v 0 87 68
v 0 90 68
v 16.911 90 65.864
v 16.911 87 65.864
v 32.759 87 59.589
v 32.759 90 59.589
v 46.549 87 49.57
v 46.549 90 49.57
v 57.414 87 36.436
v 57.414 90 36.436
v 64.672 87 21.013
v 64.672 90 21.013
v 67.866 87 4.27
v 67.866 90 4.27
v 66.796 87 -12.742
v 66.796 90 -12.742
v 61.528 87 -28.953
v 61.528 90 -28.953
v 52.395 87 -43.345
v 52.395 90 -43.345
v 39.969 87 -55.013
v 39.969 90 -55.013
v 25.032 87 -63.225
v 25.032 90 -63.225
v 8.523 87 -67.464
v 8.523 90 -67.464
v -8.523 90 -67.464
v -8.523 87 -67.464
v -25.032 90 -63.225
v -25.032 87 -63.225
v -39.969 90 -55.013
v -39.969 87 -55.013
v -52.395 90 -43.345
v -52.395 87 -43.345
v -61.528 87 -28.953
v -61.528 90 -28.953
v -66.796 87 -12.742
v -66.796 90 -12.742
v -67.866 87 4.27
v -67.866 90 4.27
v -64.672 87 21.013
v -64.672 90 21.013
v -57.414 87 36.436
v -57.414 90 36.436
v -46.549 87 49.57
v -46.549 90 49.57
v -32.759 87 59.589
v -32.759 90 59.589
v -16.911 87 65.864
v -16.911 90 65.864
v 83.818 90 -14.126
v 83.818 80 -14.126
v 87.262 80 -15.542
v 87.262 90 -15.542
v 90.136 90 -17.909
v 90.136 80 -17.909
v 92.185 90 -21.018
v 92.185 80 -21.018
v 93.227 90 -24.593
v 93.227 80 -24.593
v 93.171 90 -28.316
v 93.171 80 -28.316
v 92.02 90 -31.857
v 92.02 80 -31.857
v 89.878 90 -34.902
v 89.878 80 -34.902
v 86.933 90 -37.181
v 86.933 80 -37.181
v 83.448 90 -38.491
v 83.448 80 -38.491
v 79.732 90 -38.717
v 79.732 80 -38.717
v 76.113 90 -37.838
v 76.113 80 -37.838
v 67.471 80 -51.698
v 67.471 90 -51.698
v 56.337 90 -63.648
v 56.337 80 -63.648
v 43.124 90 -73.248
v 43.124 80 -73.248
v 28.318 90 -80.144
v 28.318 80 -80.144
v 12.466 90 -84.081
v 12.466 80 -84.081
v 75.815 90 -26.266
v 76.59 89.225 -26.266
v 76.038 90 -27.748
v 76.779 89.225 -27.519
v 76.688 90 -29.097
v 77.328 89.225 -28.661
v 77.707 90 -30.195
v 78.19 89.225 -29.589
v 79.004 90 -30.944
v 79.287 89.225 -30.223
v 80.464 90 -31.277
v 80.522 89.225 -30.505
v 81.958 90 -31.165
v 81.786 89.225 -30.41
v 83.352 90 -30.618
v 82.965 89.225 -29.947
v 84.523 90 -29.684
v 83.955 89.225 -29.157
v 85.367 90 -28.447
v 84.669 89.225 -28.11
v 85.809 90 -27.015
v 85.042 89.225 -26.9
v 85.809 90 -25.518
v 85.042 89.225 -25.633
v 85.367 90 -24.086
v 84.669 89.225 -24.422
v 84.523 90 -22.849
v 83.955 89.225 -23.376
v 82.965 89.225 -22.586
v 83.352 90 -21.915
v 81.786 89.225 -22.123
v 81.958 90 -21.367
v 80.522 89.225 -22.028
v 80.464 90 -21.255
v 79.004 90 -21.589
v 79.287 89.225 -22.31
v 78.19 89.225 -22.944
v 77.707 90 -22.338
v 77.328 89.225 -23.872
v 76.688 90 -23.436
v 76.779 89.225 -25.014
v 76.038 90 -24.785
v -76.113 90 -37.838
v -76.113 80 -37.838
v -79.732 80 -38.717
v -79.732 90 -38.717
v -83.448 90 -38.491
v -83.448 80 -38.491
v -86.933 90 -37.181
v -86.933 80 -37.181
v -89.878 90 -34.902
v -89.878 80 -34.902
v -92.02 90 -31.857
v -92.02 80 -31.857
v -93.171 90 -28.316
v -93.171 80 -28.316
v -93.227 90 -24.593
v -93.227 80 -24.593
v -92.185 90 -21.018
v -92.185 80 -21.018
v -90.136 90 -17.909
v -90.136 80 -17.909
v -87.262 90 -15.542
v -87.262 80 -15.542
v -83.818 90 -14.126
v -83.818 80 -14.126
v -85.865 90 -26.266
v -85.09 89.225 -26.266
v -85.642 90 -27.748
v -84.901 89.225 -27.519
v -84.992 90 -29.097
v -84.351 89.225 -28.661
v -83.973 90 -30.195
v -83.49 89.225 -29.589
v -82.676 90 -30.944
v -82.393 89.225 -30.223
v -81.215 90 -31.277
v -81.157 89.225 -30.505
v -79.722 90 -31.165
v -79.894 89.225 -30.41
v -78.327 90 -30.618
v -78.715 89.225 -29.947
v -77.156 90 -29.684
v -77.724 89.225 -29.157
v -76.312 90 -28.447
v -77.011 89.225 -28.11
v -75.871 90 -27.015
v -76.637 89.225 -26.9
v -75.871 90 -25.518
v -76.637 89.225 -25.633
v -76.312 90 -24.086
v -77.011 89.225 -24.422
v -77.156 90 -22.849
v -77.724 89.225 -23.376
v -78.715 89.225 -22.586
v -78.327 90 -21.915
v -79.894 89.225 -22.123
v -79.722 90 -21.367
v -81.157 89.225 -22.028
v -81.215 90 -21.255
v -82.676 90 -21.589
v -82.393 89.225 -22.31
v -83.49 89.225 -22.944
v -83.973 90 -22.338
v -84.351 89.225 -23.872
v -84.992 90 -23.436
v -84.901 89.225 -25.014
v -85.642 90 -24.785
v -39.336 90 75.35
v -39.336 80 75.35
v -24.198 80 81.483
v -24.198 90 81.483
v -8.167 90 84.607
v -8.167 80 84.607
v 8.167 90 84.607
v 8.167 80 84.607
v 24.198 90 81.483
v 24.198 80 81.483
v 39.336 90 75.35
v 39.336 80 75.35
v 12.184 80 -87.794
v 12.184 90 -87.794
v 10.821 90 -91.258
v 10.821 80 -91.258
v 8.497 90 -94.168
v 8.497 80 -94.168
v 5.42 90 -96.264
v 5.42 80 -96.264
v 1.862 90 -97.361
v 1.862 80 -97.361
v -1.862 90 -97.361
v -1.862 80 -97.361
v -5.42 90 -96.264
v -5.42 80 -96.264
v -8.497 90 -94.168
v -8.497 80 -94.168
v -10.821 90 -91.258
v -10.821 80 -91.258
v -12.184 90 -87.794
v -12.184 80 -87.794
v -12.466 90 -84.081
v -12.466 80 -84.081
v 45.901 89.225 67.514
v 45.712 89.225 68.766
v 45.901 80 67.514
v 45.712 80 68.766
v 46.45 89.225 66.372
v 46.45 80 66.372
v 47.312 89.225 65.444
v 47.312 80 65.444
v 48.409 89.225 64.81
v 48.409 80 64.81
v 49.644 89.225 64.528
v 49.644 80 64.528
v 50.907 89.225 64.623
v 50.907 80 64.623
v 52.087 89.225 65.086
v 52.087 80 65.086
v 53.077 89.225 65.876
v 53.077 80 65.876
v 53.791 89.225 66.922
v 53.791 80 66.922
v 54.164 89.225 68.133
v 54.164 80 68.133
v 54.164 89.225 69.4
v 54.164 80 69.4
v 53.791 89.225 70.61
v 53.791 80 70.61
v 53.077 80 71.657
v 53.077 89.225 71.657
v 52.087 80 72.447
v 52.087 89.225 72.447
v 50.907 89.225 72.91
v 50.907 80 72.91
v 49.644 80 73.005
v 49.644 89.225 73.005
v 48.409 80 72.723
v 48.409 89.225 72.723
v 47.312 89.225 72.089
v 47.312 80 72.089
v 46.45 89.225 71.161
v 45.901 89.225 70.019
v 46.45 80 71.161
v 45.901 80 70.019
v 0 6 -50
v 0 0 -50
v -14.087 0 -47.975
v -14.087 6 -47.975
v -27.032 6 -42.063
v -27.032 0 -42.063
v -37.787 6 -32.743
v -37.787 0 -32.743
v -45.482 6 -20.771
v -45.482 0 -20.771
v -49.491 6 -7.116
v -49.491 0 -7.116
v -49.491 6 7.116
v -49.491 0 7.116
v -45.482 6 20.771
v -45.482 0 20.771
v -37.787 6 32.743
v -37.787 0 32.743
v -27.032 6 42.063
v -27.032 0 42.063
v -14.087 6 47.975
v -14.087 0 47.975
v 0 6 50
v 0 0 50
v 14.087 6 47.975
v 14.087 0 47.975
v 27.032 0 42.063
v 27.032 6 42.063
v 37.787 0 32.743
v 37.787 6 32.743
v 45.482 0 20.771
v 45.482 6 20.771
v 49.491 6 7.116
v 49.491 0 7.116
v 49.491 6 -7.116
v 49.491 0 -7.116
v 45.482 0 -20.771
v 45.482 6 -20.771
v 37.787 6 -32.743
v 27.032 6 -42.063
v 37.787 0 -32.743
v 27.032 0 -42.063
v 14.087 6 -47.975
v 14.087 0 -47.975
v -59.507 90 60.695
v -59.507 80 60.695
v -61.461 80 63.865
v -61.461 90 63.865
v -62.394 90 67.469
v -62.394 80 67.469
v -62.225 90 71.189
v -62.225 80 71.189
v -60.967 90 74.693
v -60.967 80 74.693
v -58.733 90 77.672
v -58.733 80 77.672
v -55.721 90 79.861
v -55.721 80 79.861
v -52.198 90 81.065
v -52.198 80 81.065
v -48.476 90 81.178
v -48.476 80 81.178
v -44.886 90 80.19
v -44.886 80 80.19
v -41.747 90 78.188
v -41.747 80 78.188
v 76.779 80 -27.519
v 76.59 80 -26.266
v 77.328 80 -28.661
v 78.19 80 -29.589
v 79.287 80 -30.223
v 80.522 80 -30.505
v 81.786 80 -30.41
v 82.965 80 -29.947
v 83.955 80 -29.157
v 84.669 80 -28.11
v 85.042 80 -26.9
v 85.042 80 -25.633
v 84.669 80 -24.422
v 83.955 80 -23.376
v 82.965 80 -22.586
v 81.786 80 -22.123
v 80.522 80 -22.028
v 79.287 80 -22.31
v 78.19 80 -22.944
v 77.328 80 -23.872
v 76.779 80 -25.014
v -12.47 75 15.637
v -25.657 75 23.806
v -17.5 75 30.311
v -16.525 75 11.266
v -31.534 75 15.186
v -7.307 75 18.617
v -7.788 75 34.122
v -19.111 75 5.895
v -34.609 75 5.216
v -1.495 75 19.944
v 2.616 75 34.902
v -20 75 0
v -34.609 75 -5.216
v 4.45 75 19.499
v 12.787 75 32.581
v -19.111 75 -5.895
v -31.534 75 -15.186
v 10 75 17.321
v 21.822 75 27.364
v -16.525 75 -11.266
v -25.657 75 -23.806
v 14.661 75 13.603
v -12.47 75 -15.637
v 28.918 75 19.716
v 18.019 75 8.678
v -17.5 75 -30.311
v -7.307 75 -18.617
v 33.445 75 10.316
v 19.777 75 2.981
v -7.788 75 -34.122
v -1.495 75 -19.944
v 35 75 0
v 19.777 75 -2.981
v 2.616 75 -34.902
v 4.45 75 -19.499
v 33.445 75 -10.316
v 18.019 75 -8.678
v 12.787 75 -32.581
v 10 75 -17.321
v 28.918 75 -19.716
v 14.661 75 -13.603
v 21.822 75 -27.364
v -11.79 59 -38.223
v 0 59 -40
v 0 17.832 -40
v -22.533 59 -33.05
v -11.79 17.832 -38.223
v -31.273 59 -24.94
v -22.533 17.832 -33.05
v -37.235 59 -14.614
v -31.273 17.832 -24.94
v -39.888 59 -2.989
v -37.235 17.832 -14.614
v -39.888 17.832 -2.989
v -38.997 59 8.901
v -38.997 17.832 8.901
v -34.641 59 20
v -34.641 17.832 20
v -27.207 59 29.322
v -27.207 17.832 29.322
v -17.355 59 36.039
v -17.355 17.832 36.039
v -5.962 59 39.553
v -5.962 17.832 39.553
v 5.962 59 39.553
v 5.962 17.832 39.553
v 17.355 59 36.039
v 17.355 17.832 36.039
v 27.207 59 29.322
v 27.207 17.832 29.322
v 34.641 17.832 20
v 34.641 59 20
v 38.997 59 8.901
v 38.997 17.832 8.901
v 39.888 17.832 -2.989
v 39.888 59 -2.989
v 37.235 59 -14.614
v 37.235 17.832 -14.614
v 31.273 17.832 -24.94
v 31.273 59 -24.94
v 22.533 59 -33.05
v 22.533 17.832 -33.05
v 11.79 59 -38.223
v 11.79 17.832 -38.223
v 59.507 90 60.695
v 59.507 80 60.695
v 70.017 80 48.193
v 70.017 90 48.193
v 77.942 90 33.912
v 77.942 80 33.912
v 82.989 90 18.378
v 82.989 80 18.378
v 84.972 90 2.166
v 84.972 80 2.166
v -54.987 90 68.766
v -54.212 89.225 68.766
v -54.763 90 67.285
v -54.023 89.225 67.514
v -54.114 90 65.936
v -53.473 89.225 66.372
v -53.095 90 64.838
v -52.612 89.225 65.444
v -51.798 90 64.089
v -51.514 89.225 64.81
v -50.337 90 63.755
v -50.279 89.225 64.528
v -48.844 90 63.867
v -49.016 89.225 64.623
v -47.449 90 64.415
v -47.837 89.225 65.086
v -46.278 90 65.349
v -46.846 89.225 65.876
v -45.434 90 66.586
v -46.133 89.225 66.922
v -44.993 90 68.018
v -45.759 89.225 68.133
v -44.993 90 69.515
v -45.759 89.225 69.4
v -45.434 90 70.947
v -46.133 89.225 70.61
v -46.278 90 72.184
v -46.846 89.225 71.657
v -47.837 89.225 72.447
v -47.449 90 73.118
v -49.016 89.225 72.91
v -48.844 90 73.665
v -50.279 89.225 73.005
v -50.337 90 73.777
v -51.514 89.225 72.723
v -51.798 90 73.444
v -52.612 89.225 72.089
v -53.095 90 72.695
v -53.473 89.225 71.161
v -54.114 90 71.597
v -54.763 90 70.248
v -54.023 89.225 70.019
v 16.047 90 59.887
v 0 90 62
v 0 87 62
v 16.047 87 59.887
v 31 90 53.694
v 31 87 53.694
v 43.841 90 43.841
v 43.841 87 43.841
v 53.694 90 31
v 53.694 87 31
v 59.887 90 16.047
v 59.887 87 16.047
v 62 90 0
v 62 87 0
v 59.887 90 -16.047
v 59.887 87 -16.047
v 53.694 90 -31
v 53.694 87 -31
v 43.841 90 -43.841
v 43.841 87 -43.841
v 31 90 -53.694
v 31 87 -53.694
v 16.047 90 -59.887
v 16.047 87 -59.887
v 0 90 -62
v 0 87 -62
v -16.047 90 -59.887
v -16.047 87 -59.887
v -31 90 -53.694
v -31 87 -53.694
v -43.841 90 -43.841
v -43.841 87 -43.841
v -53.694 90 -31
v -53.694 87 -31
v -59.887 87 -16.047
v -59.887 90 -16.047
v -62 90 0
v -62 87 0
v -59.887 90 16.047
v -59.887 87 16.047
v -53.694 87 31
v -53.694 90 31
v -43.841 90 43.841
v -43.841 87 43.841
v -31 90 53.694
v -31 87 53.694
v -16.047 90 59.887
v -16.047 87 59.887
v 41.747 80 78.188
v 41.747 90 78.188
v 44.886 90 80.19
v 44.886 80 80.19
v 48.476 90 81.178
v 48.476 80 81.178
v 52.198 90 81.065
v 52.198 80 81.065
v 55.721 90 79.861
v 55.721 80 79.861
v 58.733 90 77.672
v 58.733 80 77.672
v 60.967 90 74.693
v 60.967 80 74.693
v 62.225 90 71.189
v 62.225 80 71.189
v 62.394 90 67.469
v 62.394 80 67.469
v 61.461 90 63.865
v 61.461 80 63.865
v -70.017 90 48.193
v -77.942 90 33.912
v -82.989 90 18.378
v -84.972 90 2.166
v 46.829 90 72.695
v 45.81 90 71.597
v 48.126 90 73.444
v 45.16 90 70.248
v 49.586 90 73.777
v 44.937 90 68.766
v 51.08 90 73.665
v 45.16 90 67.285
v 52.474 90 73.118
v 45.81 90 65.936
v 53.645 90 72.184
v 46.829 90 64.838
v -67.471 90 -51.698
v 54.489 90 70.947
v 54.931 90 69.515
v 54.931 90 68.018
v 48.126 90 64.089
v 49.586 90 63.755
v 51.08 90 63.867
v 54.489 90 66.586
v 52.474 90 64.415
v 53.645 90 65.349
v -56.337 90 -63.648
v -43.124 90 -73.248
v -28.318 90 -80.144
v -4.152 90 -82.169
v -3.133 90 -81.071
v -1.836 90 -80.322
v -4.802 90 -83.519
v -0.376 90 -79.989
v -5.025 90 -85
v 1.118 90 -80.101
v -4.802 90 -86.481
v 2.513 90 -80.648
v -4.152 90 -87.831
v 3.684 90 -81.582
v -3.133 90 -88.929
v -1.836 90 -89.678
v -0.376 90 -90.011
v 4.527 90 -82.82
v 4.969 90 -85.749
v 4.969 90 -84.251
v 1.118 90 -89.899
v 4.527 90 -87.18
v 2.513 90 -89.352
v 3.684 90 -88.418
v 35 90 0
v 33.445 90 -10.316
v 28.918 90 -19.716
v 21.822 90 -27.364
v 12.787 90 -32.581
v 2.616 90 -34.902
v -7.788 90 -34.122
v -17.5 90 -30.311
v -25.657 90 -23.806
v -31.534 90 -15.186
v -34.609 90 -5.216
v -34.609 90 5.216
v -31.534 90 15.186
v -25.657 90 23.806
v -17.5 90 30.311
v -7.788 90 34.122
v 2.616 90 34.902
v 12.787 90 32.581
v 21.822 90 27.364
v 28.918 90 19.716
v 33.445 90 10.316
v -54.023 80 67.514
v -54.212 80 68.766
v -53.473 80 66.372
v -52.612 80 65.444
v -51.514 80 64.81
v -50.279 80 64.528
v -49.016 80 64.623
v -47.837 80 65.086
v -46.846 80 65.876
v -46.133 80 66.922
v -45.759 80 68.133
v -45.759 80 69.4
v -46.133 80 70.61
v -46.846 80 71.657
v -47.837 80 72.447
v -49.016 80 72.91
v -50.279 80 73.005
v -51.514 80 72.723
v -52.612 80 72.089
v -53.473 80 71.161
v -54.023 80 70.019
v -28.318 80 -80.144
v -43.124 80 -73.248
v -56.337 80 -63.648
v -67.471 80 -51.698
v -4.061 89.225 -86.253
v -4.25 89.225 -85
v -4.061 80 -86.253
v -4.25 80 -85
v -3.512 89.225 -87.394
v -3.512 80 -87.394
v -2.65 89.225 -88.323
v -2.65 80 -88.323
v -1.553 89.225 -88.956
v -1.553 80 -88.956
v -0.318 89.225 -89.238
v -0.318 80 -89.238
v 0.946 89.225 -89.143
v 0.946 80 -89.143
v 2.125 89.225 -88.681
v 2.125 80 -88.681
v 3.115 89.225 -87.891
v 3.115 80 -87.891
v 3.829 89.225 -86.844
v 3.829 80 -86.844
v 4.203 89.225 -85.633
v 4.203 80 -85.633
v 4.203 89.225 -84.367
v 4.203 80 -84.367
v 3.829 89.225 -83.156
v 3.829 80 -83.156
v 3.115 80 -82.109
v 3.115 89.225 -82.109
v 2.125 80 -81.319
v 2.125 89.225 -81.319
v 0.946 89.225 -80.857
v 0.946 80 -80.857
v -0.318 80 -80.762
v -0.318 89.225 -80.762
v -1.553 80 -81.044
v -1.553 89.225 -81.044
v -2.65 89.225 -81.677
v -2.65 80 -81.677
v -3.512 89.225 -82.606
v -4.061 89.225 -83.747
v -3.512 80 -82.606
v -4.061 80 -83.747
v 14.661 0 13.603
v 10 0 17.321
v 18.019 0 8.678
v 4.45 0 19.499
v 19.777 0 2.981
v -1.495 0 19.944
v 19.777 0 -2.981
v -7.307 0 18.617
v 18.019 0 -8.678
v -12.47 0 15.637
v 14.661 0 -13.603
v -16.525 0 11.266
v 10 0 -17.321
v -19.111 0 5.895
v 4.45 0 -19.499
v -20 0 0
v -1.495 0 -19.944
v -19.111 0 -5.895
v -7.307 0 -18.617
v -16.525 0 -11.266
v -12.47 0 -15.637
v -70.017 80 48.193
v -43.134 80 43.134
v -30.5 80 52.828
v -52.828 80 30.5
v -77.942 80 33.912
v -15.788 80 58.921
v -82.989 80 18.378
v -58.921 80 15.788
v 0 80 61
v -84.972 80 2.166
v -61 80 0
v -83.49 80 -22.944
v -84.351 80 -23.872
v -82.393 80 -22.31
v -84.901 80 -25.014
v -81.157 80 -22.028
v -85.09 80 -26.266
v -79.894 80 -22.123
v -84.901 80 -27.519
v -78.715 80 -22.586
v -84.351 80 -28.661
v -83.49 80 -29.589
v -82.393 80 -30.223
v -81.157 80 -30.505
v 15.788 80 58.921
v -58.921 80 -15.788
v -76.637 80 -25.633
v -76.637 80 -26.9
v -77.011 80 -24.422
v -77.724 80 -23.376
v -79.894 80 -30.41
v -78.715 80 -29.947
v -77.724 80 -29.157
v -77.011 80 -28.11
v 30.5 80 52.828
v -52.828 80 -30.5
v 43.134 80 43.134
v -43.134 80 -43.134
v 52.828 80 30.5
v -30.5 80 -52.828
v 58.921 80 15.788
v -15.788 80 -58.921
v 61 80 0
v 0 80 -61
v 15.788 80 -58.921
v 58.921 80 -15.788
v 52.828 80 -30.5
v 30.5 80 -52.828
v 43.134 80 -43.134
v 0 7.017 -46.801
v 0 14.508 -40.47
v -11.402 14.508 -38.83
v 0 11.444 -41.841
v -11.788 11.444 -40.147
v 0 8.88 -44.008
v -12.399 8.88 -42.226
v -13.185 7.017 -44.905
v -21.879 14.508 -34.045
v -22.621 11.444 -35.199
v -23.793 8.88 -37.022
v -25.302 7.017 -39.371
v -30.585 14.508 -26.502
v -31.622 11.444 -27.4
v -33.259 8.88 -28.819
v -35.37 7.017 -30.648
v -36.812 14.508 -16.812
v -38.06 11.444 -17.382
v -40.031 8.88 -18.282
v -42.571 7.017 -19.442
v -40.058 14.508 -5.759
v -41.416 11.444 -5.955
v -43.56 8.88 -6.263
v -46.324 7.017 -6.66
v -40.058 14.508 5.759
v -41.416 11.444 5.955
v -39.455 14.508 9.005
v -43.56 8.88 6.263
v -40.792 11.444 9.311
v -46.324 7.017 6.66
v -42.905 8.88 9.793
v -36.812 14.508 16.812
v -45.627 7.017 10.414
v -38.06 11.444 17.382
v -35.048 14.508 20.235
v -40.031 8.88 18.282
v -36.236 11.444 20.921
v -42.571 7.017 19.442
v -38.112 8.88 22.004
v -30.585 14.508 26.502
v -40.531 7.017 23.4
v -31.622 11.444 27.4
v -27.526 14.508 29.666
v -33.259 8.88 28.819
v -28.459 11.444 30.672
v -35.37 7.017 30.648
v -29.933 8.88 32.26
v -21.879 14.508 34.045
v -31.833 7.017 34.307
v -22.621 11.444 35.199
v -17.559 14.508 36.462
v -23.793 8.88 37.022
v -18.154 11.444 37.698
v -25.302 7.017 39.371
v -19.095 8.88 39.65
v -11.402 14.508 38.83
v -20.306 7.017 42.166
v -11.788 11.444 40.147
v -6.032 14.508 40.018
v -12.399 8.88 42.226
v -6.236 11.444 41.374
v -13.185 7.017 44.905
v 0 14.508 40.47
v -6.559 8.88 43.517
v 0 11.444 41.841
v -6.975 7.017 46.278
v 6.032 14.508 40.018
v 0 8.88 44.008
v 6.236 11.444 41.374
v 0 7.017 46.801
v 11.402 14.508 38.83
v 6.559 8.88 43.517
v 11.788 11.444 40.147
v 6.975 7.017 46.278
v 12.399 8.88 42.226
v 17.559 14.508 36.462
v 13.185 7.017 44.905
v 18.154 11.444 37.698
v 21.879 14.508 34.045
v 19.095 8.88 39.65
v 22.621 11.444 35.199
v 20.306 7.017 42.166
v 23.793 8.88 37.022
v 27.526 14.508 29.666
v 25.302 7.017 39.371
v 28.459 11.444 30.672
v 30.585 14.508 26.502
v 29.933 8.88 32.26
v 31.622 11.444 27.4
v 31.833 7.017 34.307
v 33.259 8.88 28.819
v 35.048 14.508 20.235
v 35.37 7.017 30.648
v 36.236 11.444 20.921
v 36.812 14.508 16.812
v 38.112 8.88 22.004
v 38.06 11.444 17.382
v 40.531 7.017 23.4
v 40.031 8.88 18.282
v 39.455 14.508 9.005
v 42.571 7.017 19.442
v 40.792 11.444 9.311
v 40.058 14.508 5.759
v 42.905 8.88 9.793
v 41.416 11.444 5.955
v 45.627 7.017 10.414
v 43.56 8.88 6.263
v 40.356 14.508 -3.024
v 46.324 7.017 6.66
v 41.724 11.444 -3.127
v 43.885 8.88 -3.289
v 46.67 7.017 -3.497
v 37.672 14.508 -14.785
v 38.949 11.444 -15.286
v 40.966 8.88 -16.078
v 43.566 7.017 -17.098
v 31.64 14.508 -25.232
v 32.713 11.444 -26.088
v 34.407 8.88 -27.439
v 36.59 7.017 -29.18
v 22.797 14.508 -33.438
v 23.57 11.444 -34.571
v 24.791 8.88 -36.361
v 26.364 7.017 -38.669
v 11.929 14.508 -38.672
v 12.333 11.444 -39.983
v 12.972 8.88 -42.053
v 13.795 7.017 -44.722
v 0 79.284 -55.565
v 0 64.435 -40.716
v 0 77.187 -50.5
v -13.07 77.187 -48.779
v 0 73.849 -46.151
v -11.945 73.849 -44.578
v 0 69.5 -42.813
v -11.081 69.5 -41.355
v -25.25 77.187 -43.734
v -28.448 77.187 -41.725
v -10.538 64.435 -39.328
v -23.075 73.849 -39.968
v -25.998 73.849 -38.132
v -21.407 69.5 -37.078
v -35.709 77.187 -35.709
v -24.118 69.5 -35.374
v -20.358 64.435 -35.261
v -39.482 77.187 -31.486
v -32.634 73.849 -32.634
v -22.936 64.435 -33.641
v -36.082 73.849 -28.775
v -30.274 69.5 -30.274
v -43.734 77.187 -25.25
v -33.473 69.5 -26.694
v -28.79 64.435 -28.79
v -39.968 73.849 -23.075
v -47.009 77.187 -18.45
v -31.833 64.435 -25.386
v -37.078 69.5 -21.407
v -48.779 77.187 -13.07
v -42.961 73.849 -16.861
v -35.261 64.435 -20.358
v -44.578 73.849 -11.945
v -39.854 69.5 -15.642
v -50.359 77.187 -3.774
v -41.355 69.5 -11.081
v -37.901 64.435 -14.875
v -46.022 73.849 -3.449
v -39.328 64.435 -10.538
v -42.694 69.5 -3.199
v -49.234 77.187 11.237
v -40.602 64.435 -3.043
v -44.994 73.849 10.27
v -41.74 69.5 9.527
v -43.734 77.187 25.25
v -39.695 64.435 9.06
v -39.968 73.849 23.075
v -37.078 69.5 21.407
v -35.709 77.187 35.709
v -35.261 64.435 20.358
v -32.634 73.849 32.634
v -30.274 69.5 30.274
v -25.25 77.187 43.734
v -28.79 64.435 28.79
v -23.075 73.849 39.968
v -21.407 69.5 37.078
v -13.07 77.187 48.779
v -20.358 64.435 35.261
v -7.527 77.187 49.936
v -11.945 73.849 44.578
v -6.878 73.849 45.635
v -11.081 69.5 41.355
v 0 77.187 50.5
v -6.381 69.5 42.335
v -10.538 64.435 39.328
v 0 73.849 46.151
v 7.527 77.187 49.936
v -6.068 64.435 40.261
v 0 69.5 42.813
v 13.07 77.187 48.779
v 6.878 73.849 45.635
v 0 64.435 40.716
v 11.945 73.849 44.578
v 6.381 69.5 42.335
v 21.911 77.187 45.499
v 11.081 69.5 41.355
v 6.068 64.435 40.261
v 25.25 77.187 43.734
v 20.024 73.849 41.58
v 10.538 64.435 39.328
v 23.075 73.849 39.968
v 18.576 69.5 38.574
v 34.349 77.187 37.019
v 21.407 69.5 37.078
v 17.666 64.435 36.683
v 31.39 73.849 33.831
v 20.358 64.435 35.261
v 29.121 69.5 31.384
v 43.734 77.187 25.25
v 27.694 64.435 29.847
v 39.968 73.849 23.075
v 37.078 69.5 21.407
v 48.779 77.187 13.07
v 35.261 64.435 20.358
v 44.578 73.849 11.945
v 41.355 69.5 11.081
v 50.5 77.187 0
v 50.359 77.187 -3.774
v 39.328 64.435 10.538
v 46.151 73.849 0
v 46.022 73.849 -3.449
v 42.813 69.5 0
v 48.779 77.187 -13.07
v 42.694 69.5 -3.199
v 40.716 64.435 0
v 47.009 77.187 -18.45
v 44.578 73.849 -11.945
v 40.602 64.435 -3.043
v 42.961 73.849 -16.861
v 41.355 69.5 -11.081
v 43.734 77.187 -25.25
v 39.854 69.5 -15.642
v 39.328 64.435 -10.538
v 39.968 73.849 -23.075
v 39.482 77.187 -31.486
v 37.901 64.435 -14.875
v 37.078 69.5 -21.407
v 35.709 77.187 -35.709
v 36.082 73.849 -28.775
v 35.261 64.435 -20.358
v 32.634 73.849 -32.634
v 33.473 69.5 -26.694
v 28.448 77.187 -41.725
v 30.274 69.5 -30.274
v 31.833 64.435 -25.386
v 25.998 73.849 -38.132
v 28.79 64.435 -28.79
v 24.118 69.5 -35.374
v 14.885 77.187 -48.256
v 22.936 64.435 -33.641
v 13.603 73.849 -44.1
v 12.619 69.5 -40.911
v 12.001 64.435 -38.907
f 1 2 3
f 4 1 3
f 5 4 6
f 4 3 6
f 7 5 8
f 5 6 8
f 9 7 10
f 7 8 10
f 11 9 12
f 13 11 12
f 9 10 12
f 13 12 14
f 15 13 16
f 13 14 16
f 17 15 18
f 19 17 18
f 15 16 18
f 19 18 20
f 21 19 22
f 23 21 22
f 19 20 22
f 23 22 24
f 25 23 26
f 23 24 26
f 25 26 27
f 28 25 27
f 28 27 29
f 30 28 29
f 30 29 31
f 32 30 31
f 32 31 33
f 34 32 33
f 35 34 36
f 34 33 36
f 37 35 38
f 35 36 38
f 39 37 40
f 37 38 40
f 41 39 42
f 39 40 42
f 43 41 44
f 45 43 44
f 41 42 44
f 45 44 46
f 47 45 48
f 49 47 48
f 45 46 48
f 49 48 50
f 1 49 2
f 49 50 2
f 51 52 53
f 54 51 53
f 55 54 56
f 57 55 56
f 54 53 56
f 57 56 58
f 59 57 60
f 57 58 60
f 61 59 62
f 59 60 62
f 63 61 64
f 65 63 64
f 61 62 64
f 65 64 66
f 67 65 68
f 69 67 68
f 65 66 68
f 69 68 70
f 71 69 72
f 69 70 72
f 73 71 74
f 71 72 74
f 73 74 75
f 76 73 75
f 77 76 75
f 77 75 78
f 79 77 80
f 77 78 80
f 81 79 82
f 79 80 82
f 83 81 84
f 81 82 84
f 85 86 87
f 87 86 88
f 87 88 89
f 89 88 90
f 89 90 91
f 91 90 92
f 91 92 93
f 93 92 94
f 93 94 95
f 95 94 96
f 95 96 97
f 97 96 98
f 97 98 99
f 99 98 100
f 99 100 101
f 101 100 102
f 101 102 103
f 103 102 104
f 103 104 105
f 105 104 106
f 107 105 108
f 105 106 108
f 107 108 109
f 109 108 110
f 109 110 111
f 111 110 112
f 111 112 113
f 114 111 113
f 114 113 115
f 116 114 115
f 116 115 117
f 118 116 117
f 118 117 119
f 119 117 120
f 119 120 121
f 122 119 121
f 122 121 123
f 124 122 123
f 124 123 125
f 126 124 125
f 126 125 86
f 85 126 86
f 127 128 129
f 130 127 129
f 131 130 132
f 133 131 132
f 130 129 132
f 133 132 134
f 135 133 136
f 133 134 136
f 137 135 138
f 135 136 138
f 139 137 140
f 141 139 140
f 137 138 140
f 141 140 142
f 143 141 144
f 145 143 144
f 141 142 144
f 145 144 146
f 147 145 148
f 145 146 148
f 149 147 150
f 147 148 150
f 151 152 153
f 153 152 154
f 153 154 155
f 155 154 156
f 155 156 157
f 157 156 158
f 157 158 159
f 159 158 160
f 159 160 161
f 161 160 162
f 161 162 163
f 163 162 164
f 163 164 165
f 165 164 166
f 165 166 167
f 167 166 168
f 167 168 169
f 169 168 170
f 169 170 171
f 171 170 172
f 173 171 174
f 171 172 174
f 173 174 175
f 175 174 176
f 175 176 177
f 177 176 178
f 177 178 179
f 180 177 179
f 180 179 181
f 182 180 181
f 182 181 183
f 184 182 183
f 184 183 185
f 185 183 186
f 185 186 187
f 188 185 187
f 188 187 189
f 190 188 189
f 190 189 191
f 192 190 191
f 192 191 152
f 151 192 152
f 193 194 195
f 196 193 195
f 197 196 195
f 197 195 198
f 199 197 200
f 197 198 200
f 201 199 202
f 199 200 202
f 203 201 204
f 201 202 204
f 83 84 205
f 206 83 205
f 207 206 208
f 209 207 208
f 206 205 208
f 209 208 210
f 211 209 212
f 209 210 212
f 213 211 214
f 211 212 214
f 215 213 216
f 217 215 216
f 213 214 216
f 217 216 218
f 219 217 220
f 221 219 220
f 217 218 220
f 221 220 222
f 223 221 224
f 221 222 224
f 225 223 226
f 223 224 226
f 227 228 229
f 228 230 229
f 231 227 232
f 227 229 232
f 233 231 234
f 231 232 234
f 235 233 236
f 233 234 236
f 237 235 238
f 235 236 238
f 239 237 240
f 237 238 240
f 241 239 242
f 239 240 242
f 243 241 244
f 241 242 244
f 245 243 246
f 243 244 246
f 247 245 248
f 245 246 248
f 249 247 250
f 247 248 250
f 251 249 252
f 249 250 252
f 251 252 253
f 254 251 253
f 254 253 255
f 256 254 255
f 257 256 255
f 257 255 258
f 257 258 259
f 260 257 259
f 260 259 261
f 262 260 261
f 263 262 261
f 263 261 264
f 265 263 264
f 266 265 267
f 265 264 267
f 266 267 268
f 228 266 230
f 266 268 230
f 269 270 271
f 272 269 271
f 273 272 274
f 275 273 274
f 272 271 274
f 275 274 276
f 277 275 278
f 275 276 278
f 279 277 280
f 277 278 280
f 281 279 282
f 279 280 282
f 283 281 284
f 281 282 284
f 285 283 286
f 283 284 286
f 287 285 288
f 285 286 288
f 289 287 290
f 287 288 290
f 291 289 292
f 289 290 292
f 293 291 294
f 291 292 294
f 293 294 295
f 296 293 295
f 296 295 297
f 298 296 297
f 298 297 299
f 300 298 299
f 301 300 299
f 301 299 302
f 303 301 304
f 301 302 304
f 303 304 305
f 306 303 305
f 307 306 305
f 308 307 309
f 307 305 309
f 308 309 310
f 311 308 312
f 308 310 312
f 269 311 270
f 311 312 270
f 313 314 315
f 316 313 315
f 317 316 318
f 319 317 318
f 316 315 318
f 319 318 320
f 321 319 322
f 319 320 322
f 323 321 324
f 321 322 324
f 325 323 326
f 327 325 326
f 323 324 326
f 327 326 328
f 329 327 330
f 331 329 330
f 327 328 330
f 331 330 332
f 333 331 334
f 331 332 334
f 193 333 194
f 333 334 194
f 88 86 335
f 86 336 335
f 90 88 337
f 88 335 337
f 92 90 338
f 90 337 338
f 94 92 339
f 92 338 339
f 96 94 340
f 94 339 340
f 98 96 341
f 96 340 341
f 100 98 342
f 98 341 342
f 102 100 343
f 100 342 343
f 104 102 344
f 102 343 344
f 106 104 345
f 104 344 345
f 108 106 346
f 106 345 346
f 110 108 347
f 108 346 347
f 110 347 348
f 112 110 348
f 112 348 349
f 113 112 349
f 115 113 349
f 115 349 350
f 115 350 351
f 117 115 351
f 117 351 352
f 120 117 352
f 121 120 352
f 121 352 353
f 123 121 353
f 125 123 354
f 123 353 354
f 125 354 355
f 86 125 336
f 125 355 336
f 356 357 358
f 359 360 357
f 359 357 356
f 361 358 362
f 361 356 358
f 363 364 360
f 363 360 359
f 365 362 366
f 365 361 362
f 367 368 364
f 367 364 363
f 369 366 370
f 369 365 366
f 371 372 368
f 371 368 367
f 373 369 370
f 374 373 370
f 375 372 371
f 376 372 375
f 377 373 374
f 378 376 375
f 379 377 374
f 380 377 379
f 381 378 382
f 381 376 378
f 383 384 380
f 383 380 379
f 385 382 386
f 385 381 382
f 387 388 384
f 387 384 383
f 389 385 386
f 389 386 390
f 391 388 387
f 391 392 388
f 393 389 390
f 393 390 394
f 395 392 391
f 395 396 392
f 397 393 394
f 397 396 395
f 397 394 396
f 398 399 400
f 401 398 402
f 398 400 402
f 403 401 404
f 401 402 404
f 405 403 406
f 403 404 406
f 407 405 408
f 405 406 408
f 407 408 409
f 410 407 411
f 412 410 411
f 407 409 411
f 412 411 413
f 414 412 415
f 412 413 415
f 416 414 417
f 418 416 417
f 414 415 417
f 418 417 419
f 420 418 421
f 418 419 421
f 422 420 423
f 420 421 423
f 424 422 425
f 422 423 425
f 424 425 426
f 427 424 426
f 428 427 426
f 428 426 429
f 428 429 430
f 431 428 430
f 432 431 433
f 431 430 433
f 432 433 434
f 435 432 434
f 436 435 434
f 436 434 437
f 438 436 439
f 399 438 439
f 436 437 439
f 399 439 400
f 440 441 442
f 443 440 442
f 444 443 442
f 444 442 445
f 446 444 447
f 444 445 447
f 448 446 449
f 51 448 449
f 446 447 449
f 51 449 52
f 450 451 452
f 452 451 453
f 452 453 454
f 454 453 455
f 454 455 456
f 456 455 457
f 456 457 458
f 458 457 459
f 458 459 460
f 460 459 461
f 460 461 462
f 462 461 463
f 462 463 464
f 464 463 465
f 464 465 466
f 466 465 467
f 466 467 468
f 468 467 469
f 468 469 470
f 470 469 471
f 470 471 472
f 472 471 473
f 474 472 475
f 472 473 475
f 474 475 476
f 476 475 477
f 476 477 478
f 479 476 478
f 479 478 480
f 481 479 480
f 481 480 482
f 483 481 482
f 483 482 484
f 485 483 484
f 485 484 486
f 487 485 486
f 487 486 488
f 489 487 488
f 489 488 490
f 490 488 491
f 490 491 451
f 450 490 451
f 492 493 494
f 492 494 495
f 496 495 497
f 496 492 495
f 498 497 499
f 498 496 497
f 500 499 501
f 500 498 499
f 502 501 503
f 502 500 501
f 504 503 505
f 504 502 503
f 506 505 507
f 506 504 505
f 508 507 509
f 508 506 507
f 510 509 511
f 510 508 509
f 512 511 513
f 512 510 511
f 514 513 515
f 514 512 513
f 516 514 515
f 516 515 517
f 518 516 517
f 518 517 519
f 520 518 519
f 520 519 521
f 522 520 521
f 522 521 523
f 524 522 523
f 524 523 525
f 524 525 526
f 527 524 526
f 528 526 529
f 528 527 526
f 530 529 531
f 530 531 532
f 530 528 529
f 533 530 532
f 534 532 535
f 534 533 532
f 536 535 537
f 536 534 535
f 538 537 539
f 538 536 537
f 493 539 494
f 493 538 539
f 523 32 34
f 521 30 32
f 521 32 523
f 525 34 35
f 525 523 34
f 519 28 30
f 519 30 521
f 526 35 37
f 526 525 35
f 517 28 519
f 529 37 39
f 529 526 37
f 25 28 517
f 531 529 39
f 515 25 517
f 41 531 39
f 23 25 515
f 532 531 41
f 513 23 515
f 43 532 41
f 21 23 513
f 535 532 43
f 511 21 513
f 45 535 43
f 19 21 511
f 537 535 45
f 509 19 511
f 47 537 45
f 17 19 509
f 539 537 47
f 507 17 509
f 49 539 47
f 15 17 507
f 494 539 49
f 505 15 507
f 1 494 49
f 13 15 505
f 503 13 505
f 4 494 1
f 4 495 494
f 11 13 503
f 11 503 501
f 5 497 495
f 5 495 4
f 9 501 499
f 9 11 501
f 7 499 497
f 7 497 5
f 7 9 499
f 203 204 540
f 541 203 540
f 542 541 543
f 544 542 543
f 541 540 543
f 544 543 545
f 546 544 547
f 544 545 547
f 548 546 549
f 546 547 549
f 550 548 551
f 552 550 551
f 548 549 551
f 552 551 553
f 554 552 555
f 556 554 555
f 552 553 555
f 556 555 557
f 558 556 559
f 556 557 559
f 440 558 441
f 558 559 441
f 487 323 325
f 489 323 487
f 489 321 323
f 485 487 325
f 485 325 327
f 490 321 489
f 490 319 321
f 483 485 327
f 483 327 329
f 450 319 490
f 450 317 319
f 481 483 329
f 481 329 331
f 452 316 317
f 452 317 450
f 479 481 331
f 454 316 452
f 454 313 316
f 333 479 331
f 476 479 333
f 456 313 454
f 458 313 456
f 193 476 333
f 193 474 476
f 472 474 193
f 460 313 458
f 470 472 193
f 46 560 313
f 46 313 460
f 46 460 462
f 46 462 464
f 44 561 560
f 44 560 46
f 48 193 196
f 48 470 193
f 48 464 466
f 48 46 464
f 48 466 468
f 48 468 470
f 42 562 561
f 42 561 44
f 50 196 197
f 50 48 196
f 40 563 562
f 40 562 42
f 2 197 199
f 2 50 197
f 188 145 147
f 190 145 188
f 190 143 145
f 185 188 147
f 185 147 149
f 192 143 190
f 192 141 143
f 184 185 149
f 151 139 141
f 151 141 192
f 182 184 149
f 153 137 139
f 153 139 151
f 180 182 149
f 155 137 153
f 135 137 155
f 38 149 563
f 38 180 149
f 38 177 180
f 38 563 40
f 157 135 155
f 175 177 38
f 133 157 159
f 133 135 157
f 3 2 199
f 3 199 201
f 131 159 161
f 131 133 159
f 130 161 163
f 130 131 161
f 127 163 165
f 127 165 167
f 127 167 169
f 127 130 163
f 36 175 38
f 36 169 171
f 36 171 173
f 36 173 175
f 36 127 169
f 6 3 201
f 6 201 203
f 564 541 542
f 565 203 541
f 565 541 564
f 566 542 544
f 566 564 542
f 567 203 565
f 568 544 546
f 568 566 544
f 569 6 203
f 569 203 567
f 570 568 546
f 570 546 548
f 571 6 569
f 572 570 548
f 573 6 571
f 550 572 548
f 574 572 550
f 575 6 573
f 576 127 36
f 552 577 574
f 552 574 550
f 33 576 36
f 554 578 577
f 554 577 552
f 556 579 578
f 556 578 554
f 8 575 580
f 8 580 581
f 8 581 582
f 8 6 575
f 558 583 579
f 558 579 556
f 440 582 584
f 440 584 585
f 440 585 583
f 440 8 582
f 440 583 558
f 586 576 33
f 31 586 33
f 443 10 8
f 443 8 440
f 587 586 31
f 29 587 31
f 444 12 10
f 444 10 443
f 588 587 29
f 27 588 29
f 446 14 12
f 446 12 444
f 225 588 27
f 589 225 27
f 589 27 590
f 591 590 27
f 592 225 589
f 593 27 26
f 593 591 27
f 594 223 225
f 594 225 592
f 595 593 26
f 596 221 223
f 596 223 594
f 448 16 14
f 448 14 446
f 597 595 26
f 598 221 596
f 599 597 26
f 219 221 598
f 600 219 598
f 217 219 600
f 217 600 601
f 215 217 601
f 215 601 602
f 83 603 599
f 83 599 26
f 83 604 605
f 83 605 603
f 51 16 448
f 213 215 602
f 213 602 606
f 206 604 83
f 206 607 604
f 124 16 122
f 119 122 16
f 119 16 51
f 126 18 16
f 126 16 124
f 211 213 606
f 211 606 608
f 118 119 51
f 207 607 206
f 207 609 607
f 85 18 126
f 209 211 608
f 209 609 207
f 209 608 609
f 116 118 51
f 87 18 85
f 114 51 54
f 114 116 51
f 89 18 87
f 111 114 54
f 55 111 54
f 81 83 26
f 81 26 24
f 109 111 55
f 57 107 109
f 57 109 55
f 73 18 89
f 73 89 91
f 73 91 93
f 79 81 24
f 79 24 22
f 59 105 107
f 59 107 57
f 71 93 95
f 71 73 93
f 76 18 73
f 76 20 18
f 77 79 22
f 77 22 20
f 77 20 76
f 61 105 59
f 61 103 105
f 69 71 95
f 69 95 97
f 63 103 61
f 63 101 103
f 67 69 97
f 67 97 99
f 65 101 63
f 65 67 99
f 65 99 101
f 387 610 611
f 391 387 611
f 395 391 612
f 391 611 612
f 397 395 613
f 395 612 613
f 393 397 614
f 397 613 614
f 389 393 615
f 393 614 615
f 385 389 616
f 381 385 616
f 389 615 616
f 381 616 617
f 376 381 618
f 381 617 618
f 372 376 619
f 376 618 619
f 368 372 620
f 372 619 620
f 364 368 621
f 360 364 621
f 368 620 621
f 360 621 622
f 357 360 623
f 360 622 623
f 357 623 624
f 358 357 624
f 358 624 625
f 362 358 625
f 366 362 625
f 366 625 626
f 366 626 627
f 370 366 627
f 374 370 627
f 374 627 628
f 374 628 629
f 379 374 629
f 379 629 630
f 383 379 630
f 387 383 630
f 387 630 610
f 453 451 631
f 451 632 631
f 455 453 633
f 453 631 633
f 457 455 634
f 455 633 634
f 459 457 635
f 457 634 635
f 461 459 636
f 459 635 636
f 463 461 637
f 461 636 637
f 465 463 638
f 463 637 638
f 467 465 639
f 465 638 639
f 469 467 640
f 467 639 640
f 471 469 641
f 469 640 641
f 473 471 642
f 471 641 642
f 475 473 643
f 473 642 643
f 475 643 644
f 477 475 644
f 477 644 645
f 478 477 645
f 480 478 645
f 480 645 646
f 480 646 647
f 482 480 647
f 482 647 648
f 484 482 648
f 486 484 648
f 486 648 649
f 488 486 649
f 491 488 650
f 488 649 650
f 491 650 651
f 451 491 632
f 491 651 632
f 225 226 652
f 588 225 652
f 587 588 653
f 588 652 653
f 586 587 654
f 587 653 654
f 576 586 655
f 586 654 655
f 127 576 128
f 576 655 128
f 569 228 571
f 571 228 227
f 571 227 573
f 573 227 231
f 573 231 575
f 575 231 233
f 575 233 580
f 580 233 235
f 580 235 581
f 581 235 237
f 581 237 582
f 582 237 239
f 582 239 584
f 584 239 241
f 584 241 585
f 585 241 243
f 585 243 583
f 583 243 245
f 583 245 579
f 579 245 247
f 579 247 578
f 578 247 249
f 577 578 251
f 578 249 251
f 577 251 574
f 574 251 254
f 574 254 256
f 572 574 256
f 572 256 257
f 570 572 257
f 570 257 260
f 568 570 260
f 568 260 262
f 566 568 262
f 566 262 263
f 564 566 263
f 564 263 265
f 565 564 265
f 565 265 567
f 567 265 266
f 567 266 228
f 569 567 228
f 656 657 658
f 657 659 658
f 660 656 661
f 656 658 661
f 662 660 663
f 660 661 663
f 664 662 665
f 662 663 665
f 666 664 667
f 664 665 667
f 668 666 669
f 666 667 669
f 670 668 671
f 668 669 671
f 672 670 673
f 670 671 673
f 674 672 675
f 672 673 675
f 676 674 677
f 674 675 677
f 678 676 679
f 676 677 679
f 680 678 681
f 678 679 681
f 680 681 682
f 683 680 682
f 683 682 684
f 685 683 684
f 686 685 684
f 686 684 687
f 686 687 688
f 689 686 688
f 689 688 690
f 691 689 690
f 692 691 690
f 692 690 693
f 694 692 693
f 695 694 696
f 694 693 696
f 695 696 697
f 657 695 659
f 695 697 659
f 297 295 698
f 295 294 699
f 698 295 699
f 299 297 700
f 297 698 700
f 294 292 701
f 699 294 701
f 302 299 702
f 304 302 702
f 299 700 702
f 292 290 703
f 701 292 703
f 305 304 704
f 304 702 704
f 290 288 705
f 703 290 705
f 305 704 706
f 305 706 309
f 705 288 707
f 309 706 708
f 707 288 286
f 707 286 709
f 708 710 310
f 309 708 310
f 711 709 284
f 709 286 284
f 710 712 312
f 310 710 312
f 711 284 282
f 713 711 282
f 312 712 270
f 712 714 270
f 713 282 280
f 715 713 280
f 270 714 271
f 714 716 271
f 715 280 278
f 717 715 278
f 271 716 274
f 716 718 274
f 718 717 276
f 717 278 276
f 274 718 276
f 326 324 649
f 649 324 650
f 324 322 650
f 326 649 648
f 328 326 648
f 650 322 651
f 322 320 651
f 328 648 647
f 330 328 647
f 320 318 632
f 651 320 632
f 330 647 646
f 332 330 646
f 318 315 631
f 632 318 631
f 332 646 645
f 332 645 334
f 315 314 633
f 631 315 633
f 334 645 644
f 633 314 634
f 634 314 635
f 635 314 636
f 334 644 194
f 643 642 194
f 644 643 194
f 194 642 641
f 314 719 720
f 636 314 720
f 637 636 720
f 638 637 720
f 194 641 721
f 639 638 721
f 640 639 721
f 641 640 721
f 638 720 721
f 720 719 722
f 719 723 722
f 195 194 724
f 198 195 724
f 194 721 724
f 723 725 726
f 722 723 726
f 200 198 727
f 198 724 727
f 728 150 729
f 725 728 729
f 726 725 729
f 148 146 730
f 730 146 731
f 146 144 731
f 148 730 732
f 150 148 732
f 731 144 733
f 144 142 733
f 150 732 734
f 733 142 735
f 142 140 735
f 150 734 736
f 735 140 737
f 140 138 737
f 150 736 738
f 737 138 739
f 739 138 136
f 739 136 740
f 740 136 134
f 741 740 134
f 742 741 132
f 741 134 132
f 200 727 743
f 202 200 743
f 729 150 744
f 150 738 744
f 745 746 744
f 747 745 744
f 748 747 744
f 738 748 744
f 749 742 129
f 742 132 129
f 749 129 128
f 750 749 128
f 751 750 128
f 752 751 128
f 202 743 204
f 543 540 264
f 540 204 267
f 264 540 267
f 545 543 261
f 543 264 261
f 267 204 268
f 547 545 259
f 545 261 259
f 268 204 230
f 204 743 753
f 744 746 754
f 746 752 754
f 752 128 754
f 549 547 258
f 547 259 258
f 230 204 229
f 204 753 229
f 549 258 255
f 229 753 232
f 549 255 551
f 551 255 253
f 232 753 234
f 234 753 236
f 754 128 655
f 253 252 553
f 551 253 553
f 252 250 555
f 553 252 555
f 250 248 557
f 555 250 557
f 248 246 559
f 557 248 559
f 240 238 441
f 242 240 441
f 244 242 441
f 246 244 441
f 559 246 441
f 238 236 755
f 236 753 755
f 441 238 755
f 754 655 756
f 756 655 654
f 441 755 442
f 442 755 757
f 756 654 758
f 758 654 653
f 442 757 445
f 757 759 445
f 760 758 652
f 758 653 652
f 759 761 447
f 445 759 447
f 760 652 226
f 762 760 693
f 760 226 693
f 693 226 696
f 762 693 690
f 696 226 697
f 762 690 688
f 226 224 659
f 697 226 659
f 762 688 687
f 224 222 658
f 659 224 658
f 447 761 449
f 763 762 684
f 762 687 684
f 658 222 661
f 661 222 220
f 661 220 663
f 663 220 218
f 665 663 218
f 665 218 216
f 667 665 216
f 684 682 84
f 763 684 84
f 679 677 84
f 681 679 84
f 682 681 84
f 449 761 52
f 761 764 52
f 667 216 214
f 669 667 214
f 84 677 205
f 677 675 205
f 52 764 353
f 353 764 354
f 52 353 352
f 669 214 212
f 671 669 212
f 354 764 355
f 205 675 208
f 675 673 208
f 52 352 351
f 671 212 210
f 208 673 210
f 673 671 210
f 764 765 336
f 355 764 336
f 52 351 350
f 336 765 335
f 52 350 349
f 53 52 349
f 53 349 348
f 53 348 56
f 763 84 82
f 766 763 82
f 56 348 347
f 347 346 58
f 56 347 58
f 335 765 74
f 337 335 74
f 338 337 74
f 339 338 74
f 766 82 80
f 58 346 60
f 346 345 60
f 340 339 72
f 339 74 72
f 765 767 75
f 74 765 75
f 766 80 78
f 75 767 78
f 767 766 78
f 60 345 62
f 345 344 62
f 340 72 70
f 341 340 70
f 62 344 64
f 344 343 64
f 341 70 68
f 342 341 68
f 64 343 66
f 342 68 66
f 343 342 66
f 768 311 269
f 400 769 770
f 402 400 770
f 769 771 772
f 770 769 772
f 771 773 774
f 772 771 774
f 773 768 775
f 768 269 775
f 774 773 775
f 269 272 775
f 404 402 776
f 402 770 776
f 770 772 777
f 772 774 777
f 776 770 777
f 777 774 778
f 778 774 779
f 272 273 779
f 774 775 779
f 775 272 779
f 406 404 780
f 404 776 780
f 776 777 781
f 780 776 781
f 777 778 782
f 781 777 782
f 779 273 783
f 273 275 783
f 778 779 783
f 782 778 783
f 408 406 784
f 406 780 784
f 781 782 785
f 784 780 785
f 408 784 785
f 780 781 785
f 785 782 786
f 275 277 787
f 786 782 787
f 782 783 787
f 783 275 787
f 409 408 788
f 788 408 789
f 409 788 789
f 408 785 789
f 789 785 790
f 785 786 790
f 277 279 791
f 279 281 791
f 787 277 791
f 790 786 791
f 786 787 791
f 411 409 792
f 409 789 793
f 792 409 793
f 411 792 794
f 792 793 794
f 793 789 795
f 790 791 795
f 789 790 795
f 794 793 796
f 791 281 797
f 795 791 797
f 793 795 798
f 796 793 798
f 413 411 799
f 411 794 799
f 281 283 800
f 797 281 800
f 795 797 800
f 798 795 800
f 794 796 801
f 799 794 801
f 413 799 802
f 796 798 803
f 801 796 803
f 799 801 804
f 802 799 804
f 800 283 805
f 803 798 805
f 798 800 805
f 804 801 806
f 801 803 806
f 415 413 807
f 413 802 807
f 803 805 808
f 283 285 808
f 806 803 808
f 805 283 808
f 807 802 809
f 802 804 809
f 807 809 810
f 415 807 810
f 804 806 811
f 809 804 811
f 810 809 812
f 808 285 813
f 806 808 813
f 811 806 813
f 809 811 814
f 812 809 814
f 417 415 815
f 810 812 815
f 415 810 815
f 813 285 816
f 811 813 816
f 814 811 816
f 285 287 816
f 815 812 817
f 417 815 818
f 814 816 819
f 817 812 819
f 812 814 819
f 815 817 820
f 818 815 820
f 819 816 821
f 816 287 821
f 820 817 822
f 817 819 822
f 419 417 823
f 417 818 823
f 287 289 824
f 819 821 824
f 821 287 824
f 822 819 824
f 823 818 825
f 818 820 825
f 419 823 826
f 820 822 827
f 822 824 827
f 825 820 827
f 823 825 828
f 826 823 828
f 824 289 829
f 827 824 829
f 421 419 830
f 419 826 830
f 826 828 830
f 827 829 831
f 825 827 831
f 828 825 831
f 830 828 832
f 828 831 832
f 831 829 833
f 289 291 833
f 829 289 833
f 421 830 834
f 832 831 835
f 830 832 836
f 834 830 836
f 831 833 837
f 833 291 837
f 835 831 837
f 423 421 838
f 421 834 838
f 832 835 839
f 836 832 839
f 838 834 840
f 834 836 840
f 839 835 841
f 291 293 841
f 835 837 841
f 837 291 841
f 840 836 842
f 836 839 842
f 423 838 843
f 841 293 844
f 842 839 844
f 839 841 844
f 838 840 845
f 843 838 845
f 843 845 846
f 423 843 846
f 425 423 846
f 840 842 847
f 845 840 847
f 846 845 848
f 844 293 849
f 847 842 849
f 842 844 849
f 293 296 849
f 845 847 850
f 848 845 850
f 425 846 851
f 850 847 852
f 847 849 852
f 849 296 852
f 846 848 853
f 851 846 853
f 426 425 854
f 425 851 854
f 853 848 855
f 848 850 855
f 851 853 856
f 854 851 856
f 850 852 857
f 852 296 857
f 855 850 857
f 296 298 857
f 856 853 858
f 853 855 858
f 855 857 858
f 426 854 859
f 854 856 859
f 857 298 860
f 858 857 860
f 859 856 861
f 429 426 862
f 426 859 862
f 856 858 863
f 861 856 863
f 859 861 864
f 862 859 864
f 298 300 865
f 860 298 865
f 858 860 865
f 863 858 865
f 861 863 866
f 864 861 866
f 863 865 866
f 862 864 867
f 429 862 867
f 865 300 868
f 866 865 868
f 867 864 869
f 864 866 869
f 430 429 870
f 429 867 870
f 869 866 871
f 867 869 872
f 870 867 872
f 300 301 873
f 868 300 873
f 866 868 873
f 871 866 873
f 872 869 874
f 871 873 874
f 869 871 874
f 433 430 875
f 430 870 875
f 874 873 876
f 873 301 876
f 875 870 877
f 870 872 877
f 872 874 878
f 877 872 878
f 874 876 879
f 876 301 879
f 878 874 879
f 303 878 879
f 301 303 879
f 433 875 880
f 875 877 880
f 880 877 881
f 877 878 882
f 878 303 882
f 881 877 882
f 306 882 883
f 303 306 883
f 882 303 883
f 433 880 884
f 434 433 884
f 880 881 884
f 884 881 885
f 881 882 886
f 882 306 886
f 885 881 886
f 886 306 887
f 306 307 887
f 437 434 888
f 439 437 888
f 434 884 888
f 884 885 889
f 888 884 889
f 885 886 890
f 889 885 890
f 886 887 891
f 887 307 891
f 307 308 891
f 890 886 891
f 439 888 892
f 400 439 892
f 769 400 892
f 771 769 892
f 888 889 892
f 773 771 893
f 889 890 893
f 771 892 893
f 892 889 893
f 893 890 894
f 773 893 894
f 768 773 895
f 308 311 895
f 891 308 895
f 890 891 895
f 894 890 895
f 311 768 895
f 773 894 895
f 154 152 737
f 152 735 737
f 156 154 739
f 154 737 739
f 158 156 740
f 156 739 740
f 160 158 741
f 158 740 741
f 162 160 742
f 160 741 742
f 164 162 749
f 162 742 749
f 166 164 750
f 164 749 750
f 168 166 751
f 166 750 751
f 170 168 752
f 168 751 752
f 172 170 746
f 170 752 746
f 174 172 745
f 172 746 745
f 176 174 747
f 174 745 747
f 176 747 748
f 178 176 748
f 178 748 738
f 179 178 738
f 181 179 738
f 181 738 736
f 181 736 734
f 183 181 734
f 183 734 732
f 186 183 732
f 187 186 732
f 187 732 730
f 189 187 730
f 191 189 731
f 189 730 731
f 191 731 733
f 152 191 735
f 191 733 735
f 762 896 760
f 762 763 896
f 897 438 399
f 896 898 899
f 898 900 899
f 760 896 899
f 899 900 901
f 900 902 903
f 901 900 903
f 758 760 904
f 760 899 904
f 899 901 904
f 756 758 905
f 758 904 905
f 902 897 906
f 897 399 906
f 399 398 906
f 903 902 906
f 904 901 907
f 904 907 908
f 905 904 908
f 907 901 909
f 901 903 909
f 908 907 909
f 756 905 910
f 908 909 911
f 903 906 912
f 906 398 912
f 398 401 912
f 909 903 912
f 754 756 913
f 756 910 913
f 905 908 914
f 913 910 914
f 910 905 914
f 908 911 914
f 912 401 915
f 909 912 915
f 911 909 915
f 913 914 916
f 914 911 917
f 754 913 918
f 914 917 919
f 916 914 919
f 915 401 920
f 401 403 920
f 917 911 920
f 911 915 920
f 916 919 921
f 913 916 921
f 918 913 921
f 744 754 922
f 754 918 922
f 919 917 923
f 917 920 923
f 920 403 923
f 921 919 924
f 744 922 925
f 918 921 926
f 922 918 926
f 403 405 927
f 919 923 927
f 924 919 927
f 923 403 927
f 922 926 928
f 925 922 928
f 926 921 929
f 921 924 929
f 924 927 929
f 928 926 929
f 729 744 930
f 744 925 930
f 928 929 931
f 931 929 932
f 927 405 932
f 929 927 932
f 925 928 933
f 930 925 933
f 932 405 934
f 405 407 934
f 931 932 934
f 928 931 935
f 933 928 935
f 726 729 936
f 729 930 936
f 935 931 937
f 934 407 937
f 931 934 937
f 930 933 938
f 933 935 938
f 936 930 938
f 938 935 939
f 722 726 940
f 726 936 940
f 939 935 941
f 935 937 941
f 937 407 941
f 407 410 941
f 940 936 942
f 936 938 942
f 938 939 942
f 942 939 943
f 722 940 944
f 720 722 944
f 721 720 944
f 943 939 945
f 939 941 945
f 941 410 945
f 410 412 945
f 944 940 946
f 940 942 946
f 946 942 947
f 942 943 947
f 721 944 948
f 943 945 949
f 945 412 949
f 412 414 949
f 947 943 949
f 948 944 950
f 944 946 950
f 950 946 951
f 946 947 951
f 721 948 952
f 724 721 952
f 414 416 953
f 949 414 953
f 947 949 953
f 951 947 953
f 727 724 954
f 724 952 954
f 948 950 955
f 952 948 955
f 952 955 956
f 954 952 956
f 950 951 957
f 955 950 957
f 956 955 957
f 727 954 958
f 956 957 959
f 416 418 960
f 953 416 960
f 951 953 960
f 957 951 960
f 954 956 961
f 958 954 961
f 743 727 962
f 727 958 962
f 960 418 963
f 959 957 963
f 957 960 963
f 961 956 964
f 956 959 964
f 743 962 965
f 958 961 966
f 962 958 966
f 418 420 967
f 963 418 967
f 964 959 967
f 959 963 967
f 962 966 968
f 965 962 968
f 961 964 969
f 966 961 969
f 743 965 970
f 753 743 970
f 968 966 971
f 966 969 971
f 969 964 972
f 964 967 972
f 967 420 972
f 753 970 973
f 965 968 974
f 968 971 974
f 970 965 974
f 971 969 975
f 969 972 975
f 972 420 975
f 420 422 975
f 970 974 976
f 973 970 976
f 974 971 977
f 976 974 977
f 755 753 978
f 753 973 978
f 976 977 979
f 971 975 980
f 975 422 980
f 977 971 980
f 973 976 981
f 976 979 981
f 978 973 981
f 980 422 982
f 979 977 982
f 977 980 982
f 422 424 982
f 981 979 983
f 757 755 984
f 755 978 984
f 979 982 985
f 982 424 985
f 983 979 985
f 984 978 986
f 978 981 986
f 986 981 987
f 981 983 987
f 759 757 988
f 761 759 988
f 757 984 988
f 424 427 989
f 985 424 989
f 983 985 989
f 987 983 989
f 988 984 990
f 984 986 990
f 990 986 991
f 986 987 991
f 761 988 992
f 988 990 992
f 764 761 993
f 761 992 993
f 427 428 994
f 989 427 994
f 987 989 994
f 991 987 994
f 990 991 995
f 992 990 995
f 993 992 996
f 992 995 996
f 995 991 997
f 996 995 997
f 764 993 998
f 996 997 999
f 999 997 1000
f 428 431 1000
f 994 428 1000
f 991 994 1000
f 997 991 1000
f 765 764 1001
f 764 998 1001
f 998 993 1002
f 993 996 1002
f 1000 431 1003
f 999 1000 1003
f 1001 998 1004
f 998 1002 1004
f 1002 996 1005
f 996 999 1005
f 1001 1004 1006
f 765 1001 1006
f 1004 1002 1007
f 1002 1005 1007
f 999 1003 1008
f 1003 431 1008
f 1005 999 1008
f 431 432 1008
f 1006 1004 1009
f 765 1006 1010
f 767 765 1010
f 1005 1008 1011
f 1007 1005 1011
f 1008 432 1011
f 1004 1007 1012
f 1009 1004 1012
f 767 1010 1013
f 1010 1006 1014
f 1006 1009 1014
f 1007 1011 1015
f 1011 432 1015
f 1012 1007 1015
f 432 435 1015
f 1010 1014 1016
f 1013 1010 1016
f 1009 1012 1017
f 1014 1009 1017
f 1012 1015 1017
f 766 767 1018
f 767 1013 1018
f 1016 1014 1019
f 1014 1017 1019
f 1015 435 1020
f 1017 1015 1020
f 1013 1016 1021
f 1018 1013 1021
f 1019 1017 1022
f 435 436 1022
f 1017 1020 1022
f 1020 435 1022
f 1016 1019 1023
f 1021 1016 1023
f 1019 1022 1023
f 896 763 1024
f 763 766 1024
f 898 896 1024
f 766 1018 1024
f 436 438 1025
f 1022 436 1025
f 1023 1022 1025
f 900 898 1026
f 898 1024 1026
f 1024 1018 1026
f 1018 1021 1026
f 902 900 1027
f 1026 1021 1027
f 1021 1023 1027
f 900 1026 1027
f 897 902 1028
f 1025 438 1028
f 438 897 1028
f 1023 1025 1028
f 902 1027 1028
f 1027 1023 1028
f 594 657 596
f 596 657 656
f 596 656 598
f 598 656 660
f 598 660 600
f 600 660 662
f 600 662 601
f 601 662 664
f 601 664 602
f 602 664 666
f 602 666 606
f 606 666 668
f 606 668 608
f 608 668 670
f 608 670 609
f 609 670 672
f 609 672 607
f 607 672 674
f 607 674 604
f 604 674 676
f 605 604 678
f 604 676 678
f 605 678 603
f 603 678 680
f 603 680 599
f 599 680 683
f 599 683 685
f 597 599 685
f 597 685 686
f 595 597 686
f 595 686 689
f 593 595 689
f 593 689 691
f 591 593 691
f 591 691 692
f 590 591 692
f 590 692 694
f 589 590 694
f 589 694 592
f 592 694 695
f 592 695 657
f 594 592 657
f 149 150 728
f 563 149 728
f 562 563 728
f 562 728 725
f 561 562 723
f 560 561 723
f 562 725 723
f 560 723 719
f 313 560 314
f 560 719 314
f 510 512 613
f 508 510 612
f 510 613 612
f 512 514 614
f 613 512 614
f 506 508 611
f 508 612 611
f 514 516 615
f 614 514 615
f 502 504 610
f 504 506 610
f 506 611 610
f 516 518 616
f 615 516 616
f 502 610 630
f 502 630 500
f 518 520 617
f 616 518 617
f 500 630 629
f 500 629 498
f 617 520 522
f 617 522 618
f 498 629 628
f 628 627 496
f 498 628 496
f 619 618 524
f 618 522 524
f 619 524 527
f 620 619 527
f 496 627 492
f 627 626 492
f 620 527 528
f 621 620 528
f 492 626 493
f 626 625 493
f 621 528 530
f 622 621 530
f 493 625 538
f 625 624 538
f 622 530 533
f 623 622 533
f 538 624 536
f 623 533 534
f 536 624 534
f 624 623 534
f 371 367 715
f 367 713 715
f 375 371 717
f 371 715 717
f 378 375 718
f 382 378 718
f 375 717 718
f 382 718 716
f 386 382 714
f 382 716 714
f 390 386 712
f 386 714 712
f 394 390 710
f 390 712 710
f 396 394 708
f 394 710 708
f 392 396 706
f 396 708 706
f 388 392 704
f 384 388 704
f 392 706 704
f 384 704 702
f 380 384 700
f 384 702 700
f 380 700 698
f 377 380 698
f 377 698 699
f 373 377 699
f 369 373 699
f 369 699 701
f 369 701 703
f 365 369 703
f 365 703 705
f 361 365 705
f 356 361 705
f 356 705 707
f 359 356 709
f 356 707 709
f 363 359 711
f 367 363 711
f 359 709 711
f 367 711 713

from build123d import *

# Parameters (mm, degrees)
HOLE1_D                      = 40
HOLE1_CBORE_D                = 70
HOLE1_CBORE_DEPTH            = 15
SKETCH4_R                    = 68
SKETCH4_R_2                  = 62
CUT_EXTRUDE1_DEPTH           = 3
FILLET1_R                    = 21
FILLET2_R                    = 12
BOSS_EXTRUDE1_START          = -10
BOSS_EXTRUDE1_DEPTH          = 10
CIRPATTERN1_COUNT            = 5
M10_TAPPED_HOLE1_D           = 8.5
M10_TAPPED_HOLE1_DEPTH       = 21.946342369
M10_TAPPED_HOLE1_CSINK_D     = 10.05
M10_TAPPED_HOLE1_CSINK_ANGLE = 90
M10_TAPPED_HOLE1_TIP         = 2.553657631


with BuildPart() as part:
    # Sketch1 → Revolve1 (revolve)
    with BuildSketch(Plane.XY, mode=Mode.PRIVATE) as revolve1_sk:
        Polygon((0, 0), (0, 90), (-85, 90), (-85, 80), (-40, 80), (-40, 6), (-50, 6), (-50, 0), align=None)
    revolve(revolve1_sk.sketch.rotate(Axis((0, 0, 0), (0, 1, 0)), 270), axis=Axis((0, 0, 0), (0, 1, 0)))

    # Hole1 (through all)
    with Locations(Plane(origin=(0, 90, 0), x_dir=(1, 0, 0), z_dir=(0, 1, 0))):
        with Locations((0, 0)):
            CounterBoreHole(HOLE1_D / 2, HOLE1_CBORE_D / 2, HOLE1_CBORE_DEPTH)

    # Sketch4 → Cut-Extrude1 (cut)
    with BuildSketch(Plane(origin=(0, 90, 0), x_dir=(1, 0, 0), z_dir=(0, 1, 0))):
        with Locations(Location((0, 0, 0), (0, 0, 270))):
            Circle(SKETCH4_R)
        with Locations(Location((0, 0, 0), (0, 0, 270))):
            Circle(SKETCH4_R_2, mode=Mode.SUBTRACT)
    extrude(amount=-CUT_EXTRUDE1_DEPTH, mode=Mode.SUBTRACT)

    # Fillet1
    fillet1_edges = [part.edges().sort_by_distance(p)[0] for p in [
        (0, 80, 40),
    ]]
    fillet(fillet1_edges, radius=FILLET1_R)

    # Fillet2
    # the kernel refuses this fillet: 12 mm, written as the material it adds along each edge
    with BuildSketch(Plane(origin=(0, 6, 0), x_dir=(0, 0, -1), z_dir=(1, 0, 0))) as fillet2_piece_1:
        with BuildLine():
            CenterArc((52, 11.832159566), FILLET2_R, 180, 80.405931773)
            Line((50, 0), (49.96, -0.236643191))
            ThreePointArc((49.96, -0.236643191), (45, -0.24), (40, -0.24))
            Line((40, -0.24), (39.76, 0))
            Line((39.76, 0), (39.76, 11.832159566))
            Line((39.76, 11.832159566), (40, 11.832159566))
        make_face()
    revolve(axis=Axis((0, 6, 0), (0, 1, 0)))

    # Sketch5 → Boss-Extrude1 (add)
    with BuildSketch(Plane(origin=(0, 90, 0), x_dir=(1, 0, 0), z_dir=(0, 1, 0)).offset(BOSS_EXTRUDE1_START)):
        with BuildLine():
            ThreePointArc((12.466163113, 84.080882353), (0, 97.5), (-12.466163113, 84.080882353))
            ThreePointArc((-12.466163113, 84.080882353), (0, 85), (12.466163113, 84.080882353))
        make_face()
    boss_extrude1 = extrude(amount=BOSS_EXTRUDE1_DEPTH)

    # CirPattern1: Boss-Extrude1 ×5 about axis
    cirpattern1_axis = Axis((0, 0, 0), (0, 1, 0))
    for i in range(1, CIRPATTERN1_COUNT):
        add(boss_extrude1.rotate(cirpattern1_axis, i * 360 / CIRPATTERN1_COUNT))

    # M10 Tapped Hole1
    with Locations(Plane(origin=(0, 90, 0), x_dir=(1, 0, 0), z_dir=(0, 1, 0))):
        with Locations((49.961746445, -68.766444522), (-49.961746445, -68.766444522), (80.839803885, 26.266444522), (0, 85), (-80.839803885, 26.266444522)):
            CounterSinkHole(M10_TAPPED_HOLE1_D / 2, M10_TAPPED_HOLE1_CSINK_D / 2, depth=M10_TAPPED_HOLE1_DEPTH, counter_sink_angle=M10_TAPPED_HOLE1_CSINK_ANGLE)
            with Locations((0, 0, -(M10_TAPPED_HOLE1_DEPTH + M10_TAPPED_HOLE1_TIP / 2))):  # 118° drill point
                Cone(0, M10_TAPPED_HOLE1_D / 2, M10_TAPPED_HOLE1_TIP, mode=Mode.SUBTRACT)


solid = part.part
